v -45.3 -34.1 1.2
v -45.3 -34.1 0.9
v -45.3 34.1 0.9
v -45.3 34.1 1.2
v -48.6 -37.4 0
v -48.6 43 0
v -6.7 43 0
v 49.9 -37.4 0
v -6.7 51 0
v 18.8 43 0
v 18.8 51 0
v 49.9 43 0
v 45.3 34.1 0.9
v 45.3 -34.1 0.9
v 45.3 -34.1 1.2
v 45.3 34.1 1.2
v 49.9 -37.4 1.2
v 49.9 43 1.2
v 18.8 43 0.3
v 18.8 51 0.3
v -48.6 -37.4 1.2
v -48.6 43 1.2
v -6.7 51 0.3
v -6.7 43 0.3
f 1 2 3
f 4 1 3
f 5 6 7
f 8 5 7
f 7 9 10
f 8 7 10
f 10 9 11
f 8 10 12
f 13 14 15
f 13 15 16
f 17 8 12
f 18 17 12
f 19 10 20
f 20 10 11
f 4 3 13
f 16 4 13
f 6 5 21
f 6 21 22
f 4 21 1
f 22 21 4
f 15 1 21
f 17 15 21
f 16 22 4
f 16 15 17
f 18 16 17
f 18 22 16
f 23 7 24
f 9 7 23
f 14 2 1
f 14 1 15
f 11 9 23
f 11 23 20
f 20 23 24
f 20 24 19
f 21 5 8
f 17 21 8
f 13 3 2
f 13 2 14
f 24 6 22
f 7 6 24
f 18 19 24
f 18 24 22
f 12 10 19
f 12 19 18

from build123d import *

# Parameters (mm, degrees)
SKETCH1_W           = 90.6
SKETCH1_H           = 68.2
BOSS_EXTRUDE1_DEPTH = 1.2
SKETCH1_3_W         = 90.6
SKETCH1_3_H         = 68.2
BOSS_EXTRUDE2_DEPTH = 0.9
SKETCH1_4_W         = 25.5
SKETCH1_4_H         = 8
BOSS_EXTRUDE3_DEPTH = 0.3


with BuildPart() as part:
    # Sketch1 → Boss-Extrude1 (new body)
    with BuildSketch(Plane.XY):
        Polygon((-48.6, 43), (-48.6, -37.4), (49.9, -37.4), (49.9, 43), (18.8, 43), (-6.7, 43), align=None)
        Rectangle(SKETCH1_W, SKETCH1_H, mode=Mode.SUBTRACT)
    extrude(amount=BOSS_EXTRUDE1_DEPTH)

    # Sketch1<3> → Boss-Extrude2 (add)
    with BuildSketch(Plane.XY):
        Rectangle(SKETCH1_3_W, SKETCH1_3_H)
    extrude(amount=BOSS_EXTRUDE2_DEPTH)

    # Sketch1<4> → Boss-Extrude3 (add)
    with BuildSketch(Plane.XY):
        with Locations((6.05, 47)):
            Rectangle(SKETCH1_4_W, SKETCH1_4_H)
    extrude(amount=BOSS_EXTRUDE3_DEPTH)


solid = part.part
